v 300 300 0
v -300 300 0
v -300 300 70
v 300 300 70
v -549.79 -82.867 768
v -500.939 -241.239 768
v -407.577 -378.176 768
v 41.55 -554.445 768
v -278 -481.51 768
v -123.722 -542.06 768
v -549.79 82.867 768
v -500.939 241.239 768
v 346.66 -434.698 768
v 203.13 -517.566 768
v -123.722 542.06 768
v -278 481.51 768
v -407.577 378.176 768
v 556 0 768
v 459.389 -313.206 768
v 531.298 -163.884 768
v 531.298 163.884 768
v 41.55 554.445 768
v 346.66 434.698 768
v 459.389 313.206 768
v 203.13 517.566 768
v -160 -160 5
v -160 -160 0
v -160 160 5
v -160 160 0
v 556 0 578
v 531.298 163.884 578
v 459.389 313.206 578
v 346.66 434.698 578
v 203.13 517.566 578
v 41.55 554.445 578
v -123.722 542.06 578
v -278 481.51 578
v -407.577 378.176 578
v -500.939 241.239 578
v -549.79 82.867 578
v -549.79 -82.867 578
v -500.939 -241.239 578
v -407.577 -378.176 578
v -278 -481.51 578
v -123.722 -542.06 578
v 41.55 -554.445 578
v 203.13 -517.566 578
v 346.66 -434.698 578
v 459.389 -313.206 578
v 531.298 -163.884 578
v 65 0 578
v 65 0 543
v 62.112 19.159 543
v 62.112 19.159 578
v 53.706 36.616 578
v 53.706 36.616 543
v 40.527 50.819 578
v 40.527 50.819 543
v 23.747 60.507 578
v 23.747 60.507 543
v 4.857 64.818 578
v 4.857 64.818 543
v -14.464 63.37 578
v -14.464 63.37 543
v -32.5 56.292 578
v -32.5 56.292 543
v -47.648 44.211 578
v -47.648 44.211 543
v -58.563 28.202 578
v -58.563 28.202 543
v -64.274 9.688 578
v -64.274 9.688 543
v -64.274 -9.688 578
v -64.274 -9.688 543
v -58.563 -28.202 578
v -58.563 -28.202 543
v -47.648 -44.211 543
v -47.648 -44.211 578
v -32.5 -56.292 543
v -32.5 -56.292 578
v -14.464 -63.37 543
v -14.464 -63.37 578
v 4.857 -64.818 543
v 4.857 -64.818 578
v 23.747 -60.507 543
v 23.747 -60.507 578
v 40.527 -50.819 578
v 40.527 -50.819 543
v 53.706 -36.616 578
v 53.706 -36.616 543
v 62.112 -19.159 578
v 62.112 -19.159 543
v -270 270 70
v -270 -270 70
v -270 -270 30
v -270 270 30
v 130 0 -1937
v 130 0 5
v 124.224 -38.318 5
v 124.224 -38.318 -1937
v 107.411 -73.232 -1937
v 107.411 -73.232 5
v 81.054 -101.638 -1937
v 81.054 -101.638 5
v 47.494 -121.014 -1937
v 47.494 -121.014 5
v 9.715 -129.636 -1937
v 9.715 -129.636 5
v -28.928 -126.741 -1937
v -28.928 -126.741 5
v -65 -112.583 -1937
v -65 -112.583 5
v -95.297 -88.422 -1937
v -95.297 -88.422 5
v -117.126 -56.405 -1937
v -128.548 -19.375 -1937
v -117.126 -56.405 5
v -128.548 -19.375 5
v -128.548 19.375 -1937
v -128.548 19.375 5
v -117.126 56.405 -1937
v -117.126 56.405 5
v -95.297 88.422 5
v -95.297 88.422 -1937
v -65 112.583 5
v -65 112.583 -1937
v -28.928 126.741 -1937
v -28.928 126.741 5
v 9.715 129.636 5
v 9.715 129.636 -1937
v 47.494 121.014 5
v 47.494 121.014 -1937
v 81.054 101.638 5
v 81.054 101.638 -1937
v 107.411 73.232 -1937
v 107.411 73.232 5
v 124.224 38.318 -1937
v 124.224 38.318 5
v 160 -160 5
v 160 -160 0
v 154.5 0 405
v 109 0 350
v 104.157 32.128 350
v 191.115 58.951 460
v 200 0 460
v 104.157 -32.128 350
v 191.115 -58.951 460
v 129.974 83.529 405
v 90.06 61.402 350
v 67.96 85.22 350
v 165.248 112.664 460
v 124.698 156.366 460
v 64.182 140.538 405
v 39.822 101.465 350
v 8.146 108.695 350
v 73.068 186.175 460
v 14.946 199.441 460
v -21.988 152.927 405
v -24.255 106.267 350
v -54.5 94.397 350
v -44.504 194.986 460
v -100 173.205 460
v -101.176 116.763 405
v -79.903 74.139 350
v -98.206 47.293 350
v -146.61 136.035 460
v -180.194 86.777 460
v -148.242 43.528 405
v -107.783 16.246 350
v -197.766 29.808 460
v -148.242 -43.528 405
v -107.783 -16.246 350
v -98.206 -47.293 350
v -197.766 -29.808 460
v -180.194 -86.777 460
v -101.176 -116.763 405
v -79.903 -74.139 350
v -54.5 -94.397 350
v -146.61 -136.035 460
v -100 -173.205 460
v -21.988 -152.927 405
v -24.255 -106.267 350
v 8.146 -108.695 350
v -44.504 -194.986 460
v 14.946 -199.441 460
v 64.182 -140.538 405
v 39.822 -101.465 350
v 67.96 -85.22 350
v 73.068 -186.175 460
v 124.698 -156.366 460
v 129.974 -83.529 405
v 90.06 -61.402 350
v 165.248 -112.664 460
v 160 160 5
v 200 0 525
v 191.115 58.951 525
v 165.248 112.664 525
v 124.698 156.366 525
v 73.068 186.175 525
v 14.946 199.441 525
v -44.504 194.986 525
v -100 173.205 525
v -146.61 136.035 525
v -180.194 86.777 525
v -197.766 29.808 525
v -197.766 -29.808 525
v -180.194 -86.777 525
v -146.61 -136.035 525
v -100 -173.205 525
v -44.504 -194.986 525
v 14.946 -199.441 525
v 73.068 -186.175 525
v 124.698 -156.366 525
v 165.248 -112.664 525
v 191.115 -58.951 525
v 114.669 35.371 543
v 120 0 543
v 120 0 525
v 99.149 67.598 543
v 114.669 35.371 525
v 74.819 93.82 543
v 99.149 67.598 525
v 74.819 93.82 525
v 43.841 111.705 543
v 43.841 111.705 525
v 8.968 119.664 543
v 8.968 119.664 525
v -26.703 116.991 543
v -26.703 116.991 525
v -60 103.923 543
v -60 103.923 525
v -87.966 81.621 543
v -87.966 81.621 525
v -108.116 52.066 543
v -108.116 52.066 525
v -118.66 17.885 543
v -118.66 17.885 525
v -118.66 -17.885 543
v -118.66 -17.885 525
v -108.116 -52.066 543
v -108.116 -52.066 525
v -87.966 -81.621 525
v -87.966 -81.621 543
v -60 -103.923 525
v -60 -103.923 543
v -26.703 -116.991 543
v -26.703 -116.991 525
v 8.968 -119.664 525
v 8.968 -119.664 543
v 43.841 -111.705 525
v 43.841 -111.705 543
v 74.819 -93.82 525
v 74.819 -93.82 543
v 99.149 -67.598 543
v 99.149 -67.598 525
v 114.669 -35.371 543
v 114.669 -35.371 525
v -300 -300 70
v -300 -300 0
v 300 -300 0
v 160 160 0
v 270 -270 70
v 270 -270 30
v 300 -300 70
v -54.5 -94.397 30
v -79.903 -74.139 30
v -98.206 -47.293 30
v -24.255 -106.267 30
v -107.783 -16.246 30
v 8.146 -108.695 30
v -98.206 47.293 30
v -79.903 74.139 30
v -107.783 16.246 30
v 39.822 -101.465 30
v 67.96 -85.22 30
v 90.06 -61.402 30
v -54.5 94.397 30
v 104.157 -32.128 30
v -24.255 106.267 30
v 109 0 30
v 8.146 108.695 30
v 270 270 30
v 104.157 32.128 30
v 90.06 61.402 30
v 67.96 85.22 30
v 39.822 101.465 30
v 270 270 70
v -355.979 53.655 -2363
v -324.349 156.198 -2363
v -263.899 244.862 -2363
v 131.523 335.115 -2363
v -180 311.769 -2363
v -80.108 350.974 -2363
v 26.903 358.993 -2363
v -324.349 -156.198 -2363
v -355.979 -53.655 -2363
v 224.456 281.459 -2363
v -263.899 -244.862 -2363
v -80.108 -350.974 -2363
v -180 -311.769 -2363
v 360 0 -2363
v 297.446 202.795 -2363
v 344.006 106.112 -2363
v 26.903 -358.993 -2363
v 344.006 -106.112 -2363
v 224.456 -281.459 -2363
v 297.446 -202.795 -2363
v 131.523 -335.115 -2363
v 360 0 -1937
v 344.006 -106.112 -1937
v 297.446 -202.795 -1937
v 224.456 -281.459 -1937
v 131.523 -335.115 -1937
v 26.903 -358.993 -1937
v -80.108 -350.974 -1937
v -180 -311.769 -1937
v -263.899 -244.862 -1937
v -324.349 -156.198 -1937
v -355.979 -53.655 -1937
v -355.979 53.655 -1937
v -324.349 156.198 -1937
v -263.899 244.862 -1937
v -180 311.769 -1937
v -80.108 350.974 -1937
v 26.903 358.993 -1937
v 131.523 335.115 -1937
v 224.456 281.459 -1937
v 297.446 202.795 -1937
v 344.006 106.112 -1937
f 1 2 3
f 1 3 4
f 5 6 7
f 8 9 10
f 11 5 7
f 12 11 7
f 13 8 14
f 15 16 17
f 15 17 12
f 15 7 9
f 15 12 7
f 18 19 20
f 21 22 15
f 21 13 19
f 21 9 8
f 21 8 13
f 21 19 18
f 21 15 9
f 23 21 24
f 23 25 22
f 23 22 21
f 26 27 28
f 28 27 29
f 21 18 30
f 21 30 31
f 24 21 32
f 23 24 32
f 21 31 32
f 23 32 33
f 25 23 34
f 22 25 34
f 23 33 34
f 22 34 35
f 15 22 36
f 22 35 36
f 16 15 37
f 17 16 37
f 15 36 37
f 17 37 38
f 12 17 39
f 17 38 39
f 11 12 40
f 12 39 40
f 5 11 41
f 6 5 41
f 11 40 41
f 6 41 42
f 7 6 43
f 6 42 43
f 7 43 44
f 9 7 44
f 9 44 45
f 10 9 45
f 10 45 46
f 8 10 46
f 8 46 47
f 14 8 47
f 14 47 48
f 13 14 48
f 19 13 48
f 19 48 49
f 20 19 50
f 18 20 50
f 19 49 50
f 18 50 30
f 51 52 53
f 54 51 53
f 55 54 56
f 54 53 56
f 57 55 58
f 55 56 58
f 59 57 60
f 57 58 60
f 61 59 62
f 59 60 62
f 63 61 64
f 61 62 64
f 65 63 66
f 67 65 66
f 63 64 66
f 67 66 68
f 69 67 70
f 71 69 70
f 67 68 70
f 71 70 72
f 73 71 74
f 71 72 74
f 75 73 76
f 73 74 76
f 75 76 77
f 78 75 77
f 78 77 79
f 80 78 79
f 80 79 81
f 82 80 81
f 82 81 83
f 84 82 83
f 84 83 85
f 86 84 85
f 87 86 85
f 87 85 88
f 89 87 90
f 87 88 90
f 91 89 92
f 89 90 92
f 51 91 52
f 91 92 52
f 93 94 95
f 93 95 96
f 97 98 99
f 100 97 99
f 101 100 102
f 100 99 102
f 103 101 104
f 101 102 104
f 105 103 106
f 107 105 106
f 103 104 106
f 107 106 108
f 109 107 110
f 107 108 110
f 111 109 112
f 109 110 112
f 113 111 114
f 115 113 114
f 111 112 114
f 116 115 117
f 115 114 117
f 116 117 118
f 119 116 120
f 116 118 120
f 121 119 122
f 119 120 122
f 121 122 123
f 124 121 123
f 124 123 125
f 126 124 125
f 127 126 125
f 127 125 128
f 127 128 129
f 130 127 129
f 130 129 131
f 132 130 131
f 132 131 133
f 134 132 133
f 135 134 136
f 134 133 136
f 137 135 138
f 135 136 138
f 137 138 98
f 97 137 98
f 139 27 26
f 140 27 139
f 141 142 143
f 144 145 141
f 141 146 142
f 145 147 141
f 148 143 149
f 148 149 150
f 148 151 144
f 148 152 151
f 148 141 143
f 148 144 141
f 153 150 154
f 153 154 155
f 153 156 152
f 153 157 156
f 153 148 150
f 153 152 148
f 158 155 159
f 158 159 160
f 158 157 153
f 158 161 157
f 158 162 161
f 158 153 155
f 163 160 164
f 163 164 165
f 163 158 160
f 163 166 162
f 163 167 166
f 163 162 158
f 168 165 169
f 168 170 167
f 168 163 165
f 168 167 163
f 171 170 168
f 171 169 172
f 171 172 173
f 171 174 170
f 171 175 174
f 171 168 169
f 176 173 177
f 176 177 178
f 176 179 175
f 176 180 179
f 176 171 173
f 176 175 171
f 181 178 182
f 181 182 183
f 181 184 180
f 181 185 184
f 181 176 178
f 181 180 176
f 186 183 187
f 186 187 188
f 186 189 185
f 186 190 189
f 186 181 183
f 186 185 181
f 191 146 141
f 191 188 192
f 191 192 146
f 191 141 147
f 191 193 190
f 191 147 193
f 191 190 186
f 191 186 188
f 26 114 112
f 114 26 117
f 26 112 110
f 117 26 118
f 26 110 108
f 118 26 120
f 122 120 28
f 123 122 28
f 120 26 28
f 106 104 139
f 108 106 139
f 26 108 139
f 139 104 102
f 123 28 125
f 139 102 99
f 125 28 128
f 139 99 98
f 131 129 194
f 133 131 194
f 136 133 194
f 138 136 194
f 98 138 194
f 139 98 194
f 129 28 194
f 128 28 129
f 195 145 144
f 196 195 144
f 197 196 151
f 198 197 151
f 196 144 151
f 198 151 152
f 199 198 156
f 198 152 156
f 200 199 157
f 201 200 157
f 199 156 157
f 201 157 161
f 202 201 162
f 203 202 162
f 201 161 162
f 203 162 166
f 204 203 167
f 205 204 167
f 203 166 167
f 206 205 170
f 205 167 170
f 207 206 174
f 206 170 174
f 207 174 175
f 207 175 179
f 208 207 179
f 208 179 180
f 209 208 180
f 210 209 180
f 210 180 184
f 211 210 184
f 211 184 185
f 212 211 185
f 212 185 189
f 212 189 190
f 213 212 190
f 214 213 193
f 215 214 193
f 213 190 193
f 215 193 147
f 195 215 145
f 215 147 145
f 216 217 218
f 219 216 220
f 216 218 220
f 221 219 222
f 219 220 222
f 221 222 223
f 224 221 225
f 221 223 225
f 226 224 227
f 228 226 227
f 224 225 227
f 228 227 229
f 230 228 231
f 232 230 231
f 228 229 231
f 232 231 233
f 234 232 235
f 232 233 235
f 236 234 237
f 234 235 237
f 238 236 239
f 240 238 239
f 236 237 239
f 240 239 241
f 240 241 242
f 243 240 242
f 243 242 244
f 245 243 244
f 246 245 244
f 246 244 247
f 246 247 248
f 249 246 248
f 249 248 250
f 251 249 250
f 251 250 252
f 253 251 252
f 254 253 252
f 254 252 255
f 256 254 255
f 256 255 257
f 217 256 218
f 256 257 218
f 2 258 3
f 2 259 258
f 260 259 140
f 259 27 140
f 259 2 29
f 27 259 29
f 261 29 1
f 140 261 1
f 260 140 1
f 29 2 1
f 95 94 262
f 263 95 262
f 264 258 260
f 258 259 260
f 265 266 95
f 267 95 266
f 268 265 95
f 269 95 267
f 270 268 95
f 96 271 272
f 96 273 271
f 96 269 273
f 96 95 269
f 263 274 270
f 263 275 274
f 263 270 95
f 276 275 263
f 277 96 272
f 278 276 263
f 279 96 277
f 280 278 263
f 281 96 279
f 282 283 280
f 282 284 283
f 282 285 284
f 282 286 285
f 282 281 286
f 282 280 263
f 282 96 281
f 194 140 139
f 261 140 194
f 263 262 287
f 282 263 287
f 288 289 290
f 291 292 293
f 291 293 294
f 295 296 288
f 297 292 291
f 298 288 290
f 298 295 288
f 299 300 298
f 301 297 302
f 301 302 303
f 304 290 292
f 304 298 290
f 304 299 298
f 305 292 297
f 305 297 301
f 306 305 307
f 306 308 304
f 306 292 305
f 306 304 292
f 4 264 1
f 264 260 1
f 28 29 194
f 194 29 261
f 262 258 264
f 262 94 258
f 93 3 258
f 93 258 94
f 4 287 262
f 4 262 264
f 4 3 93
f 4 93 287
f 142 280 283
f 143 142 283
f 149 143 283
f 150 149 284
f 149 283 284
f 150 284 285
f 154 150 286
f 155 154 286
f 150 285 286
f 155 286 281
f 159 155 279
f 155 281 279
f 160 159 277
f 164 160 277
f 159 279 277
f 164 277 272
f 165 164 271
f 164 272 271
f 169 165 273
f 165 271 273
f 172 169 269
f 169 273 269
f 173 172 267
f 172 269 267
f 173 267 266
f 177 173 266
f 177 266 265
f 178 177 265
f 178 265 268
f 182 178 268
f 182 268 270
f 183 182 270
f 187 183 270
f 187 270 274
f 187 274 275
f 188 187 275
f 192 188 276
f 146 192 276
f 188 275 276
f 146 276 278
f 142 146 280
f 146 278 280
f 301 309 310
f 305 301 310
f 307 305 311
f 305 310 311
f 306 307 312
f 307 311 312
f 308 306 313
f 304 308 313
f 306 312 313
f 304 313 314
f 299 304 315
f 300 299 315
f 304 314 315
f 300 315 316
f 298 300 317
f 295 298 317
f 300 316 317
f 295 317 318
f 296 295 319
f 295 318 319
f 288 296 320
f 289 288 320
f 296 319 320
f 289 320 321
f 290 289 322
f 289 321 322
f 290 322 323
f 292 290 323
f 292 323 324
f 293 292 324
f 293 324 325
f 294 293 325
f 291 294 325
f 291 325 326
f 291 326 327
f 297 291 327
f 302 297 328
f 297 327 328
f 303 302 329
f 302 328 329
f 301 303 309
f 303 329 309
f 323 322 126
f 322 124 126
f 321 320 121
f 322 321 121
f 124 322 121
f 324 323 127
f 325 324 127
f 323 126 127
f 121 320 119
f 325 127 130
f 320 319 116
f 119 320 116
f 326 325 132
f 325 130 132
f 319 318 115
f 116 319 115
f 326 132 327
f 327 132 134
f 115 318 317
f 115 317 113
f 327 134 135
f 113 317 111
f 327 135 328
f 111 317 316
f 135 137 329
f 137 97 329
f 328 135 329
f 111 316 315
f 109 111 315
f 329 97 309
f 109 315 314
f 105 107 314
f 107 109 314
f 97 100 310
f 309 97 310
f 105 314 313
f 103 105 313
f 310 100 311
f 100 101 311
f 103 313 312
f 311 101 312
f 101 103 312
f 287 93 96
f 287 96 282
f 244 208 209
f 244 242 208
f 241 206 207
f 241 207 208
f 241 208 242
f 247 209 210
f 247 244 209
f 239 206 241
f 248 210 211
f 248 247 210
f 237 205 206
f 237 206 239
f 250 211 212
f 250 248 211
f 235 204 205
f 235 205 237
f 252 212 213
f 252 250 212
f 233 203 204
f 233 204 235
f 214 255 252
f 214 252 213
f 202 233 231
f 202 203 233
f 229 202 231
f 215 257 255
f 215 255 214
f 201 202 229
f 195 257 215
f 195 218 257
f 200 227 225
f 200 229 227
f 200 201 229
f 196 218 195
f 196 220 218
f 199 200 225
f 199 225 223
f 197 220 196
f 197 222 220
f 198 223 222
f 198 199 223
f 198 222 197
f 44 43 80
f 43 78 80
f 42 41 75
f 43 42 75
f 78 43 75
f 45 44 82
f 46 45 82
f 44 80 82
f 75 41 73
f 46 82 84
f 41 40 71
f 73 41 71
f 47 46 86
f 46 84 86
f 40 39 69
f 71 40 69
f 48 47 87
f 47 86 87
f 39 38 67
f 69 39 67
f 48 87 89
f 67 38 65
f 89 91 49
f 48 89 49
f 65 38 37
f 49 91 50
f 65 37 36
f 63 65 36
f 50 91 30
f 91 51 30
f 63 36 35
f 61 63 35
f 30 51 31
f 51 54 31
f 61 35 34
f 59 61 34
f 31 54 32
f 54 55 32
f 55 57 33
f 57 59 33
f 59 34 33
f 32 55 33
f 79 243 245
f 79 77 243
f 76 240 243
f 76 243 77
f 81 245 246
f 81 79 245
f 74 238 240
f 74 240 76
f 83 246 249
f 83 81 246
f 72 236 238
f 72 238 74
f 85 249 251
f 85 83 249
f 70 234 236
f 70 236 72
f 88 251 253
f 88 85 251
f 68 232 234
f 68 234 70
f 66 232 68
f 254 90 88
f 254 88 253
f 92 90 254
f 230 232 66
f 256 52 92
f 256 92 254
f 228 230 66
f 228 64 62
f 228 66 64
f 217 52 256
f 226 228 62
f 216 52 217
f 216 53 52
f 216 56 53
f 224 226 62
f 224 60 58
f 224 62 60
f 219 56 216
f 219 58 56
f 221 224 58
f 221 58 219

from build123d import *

# Parameters (mm, degrees)
F0_W      = 600
F0_H      = 600
F0_W_2    = 320
F0_H_2    = 320
F1_DEPTH  = 5
F2_W      = 600
F2_H      = 600
F3_DEPTH  = 65
F4_W      = 540
F4_H      = 540
F5_DEPTH  = 40
F6_R      = 109
F7_DEPTH  = 320
F8_R      = 109
F10_R     = 200
F12_R     = 200
F13_DEPTH = 65
F14_R     = 120
F15_DEPTH = 18
F16_R     = 65
F17_DEPTH = 35
F18_R     = 556
F19_DEPTH = 190
F20_R     = 130
F21_DEPTH = 1942
F22_R     = 360
F23_DEPTH = 426


with BuildPart() as f1:
    # F0 (on Top) → F1 (new body)
    with BuildSketch(Plane.XY):
        Rectangle(F0_W, F0_H)
        Rectangle(F0_W_2, F0_H_2, mode=Mode.SUBTRACT)
    extrude(amount=F1_DEPTH)

    # F2 (on face) → F3 (join)
    with BuildSketch(Plane.XY.offset(5)):
        Rectangle(F2_W, F2_H)
    extrude(amount=F3_DEPTH)

    # F4 (on face) → F5 (cut)
    with BuildSketch(Plane.XY.offset(70)):
        Rectangle(F4_W, F4_H)
    extrude(amount=-F5_DEPTH, mode=Mode.SUBTRACT)

    # F6 (on face) → F7 (join)
    with BuildSketch(Plane.XY.offset(30)):
        Circle(F6_R)
    extrude(amount=F7_DEPTH)

    # F8 (on face) → F11 section 0
    with BuildSketch(Plane.XY.offset(350)):
        Circle(F8_R)
    # F10 (on offset) → F11 section 1
    with BuildSketch(Plane.XY.offset(460)):
        Circle(F10_R)
    loft()

    # F12 (on face) → F13 (join)
    with BuildSketch(Plane.XY.offset(460)):
        Circle(F12_R)
    extrude(amount=F13_DEPTH)

    # F14 (on face) → F15 (join)
    with BuildSketch(Plane.XY.offset(525)):
        Circle(F14_R)
    extrude(amount=F15_DEPTH)

    # F16 (on face) → F17 (join)
    with BuildSketch(Plane.XY.offset(543)):
        Circle(F16_R)
    extrude(amount=F17_DEPTH)

    # F18 (on face) → F19 (join)
    with BuildSketch(Plane.XY.offset(578)):
        Circle(F18_R)
    extrude(amount=F19_DEPTH)

    # F20 (on face) → F21 (join)
    with BuildSketch(Plane(origin=(0, 0, 5), x_dir=(1, 0, 0), z_dir=(0, 0, -1))):
        Circle(F20_R)
    extrude(amount=F21_DEPTH)

    # F22 (on face) → F23 (join)
    with BuildSketch(Plane(origin=(0, 0, -1937), x_dir=(1, 0, 0), z_dir=(0, 0, -1))):
        Circle(F22_R)
    extrude(amount=F23_DEPTH)


solid = f1.part
